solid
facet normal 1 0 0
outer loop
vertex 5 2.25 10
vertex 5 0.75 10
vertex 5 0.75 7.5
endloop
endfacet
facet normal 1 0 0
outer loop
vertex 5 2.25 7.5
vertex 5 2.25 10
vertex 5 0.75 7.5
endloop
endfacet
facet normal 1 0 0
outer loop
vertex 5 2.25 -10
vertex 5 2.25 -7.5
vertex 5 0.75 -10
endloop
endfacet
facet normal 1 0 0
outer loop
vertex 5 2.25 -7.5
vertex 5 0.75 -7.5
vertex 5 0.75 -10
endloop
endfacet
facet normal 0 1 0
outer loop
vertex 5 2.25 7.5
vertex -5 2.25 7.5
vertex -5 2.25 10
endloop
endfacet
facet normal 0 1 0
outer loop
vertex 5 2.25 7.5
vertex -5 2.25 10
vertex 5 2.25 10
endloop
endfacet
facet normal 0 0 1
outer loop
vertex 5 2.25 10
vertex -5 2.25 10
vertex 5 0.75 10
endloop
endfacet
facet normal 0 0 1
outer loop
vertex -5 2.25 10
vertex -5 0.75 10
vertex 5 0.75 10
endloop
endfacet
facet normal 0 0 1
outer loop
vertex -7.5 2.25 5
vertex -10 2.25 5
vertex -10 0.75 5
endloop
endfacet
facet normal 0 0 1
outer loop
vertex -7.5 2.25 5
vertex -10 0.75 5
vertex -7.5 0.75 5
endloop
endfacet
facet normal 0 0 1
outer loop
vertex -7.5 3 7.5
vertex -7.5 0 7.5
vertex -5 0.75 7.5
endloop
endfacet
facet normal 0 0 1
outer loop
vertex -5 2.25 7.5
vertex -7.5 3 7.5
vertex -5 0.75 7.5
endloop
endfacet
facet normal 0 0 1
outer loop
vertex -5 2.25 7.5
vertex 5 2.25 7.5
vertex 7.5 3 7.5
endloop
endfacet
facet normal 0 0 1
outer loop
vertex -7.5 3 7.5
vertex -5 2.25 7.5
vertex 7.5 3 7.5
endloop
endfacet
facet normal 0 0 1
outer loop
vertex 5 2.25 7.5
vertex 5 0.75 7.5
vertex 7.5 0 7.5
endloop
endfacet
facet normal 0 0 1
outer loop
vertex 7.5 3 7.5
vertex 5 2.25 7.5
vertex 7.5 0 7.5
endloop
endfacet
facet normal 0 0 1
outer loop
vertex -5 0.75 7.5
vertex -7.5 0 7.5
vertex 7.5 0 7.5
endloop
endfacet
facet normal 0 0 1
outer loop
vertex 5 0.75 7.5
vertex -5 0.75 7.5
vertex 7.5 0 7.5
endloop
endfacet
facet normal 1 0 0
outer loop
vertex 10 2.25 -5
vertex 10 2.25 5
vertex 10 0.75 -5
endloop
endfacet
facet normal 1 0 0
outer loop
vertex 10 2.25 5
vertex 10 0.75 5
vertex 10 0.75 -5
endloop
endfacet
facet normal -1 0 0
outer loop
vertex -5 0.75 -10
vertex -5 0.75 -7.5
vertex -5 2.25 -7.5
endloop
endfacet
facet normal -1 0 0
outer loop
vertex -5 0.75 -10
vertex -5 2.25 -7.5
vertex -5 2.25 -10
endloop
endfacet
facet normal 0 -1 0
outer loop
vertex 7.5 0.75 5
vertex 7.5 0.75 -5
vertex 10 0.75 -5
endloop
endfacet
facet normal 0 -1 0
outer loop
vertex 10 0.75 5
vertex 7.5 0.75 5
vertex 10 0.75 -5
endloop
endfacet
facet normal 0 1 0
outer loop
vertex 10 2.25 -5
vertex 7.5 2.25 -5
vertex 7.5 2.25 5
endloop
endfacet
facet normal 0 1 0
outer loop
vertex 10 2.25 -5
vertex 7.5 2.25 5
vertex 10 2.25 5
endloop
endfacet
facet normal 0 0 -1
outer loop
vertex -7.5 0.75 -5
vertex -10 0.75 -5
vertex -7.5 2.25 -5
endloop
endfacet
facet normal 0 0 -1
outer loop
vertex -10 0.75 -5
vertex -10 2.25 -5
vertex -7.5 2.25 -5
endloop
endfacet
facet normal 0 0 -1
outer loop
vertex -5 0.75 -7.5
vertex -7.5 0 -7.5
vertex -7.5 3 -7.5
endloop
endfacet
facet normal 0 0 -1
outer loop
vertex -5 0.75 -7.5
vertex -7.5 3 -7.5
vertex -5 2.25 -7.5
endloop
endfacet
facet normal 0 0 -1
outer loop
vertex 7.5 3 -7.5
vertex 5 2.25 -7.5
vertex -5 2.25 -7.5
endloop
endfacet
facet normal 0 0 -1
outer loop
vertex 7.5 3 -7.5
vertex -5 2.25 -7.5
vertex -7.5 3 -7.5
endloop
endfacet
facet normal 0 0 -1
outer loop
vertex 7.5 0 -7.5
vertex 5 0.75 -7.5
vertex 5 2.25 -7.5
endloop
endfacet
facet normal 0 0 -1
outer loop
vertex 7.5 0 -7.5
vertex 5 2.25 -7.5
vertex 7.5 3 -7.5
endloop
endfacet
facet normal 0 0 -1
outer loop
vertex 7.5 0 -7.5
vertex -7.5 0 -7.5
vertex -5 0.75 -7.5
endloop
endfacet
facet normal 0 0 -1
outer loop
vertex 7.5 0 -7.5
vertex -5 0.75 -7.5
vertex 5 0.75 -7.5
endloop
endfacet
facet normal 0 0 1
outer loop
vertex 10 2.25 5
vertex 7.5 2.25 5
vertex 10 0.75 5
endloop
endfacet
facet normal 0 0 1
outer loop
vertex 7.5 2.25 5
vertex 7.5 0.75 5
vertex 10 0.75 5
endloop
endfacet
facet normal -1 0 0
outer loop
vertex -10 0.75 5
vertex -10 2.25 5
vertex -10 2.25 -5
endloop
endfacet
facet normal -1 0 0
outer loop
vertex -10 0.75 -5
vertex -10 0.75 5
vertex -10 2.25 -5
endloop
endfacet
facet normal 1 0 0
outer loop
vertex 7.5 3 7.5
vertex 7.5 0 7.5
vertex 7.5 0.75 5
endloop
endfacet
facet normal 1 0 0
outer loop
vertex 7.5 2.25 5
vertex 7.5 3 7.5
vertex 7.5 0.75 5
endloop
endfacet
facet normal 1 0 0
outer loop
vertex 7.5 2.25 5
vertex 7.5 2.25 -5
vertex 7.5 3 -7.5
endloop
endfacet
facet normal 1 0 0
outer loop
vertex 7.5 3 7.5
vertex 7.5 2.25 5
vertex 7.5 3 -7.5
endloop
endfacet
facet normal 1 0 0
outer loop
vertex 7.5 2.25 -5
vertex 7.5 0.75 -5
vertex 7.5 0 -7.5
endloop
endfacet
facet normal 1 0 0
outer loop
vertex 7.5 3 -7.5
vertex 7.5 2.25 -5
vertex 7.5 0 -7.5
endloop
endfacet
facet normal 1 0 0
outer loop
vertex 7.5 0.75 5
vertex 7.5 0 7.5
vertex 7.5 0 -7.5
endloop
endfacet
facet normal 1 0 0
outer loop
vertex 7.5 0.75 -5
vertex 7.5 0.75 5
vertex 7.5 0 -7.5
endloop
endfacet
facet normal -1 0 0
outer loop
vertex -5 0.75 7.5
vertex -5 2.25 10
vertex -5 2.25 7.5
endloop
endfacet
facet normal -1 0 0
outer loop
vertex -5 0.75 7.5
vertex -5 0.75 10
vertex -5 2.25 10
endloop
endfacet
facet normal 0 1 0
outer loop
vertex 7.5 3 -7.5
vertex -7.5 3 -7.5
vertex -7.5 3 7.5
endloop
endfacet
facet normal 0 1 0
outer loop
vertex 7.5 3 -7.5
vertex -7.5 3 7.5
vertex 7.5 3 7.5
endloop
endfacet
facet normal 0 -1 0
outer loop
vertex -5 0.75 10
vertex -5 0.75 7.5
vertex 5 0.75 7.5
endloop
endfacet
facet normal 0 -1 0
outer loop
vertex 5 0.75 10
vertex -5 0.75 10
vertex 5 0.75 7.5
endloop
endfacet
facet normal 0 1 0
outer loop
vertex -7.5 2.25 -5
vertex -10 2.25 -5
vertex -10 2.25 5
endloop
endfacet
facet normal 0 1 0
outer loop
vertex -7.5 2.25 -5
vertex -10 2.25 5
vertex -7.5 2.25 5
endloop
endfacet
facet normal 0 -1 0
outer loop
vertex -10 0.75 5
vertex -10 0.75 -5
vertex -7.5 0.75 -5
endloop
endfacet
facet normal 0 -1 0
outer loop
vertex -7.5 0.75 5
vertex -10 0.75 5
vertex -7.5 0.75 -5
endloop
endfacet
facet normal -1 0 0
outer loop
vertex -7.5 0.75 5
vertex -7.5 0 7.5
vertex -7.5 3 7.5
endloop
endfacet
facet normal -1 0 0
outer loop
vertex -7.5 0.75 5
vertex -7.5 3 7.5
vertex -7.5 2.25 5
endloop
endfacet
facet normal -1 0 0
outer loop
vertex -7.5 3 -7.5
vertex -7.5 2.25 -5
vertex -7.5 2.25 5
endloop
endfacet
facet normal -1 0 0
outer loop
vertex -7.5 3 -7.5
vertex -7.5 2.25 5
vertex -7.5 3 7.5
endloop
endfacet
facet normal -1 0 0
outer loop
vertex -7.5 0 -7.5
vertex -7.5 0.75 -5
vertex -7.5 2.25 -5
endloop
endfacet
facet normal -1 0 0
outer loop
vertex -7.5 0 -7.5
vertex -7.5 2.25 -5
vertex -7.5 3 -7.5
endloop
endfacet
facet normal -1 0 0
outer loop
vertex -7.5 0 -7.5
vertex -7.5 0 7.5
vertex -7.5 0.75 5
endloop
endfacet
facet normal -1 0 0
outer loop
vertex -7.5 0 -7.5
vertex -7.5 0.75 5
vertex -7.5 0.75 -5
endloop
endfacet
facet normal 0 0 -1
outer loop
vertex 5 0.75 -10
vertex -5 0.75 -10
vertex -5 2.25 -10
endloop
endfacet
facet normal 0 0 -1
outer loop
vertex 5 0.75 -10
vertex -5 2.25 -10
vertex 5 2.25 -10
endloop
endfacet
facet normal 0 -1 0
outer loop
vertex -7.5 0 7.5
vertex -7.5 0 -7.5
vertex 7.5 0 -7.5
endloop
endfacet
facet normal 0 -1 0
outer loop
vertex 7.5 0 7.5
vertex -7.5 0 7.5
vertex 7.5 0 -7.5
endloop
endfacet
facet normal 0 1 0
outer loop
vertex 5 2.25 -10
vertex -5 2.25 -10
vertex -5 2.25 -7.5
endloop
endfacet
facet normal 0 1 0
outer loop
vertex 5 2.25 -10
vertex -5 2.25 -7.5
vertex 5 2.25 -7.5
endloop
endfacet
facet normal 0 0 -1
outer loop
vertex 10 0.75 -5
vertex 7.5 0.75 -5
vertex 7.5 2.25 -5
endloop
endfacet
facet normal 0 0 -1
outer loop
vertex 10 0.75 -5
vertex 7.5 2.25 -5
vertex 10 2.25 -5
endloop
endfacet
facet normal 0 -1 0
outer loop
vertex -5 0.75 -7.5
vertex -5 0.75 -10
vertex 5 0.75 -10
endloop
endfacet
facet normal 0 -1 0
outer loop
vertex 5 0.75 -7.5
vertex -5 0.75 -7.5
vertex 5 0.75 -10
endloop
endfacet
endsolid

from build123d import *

# Parameters (mm, degrees)
SKETCH1_W                = 15
SKETCH1_H                = 15
BOSS_EXTRUDE2_DEPTH      = 3
SKETCH4_W                = 2.5
SKETCH4_H                = 10
SKETCH4_W_2              = 10
SKETCH4_H_2              = 2.5
BOSS_EXTRUDE3_DEPTH      = 0.75
BOSS_EXTRUDE3_DEPTH_BACK = 0.75


with BuildPart() as part:
    # Sketch1 → Boss-Extrude2 (new body)
    with BuildSketch(Plane(origin=(0, 0, 0), x_dir=(1, 0, 0), z_dir=(0, 1, 0))):
        Rectangle(SKETCH1_W, SKETCH1_H)
    extrude(amount=BOSS_EXTRUDE2_DEPTH)

    # Sketch4 → Boss-Extrude3 (add, two sides)
    with BuildSketch(Plane(origin=(0, 1.5, 0), x_dir=(1, 0, 0), z_dir=(0, 1, 0))) as boss_extrude3_sk:
        with Locations((-8.75, 0)):
            Rectangle(SKETCH4_W, SKETCH4_H)
        with Locations((0, -8.75)):
            Rectangle(SKETCH4_W_2, SKETCH4_H_2)
        with Locations((8.75, 0)):
            Rectangle(SKETCH4_W, SKETCH4_H)
        with Locations((0, 8.75)):
            Rectangle(SKETCH4_W_2, SKETCH4_H_2)
    extrude(amount=BOSS_EXTRUDE3_DEPTH)
    extrude(boss_extrude3_sk.sketch, amount=-BOSS_EXTRUDE3_DEPTH_BACK)


solid = part.part
